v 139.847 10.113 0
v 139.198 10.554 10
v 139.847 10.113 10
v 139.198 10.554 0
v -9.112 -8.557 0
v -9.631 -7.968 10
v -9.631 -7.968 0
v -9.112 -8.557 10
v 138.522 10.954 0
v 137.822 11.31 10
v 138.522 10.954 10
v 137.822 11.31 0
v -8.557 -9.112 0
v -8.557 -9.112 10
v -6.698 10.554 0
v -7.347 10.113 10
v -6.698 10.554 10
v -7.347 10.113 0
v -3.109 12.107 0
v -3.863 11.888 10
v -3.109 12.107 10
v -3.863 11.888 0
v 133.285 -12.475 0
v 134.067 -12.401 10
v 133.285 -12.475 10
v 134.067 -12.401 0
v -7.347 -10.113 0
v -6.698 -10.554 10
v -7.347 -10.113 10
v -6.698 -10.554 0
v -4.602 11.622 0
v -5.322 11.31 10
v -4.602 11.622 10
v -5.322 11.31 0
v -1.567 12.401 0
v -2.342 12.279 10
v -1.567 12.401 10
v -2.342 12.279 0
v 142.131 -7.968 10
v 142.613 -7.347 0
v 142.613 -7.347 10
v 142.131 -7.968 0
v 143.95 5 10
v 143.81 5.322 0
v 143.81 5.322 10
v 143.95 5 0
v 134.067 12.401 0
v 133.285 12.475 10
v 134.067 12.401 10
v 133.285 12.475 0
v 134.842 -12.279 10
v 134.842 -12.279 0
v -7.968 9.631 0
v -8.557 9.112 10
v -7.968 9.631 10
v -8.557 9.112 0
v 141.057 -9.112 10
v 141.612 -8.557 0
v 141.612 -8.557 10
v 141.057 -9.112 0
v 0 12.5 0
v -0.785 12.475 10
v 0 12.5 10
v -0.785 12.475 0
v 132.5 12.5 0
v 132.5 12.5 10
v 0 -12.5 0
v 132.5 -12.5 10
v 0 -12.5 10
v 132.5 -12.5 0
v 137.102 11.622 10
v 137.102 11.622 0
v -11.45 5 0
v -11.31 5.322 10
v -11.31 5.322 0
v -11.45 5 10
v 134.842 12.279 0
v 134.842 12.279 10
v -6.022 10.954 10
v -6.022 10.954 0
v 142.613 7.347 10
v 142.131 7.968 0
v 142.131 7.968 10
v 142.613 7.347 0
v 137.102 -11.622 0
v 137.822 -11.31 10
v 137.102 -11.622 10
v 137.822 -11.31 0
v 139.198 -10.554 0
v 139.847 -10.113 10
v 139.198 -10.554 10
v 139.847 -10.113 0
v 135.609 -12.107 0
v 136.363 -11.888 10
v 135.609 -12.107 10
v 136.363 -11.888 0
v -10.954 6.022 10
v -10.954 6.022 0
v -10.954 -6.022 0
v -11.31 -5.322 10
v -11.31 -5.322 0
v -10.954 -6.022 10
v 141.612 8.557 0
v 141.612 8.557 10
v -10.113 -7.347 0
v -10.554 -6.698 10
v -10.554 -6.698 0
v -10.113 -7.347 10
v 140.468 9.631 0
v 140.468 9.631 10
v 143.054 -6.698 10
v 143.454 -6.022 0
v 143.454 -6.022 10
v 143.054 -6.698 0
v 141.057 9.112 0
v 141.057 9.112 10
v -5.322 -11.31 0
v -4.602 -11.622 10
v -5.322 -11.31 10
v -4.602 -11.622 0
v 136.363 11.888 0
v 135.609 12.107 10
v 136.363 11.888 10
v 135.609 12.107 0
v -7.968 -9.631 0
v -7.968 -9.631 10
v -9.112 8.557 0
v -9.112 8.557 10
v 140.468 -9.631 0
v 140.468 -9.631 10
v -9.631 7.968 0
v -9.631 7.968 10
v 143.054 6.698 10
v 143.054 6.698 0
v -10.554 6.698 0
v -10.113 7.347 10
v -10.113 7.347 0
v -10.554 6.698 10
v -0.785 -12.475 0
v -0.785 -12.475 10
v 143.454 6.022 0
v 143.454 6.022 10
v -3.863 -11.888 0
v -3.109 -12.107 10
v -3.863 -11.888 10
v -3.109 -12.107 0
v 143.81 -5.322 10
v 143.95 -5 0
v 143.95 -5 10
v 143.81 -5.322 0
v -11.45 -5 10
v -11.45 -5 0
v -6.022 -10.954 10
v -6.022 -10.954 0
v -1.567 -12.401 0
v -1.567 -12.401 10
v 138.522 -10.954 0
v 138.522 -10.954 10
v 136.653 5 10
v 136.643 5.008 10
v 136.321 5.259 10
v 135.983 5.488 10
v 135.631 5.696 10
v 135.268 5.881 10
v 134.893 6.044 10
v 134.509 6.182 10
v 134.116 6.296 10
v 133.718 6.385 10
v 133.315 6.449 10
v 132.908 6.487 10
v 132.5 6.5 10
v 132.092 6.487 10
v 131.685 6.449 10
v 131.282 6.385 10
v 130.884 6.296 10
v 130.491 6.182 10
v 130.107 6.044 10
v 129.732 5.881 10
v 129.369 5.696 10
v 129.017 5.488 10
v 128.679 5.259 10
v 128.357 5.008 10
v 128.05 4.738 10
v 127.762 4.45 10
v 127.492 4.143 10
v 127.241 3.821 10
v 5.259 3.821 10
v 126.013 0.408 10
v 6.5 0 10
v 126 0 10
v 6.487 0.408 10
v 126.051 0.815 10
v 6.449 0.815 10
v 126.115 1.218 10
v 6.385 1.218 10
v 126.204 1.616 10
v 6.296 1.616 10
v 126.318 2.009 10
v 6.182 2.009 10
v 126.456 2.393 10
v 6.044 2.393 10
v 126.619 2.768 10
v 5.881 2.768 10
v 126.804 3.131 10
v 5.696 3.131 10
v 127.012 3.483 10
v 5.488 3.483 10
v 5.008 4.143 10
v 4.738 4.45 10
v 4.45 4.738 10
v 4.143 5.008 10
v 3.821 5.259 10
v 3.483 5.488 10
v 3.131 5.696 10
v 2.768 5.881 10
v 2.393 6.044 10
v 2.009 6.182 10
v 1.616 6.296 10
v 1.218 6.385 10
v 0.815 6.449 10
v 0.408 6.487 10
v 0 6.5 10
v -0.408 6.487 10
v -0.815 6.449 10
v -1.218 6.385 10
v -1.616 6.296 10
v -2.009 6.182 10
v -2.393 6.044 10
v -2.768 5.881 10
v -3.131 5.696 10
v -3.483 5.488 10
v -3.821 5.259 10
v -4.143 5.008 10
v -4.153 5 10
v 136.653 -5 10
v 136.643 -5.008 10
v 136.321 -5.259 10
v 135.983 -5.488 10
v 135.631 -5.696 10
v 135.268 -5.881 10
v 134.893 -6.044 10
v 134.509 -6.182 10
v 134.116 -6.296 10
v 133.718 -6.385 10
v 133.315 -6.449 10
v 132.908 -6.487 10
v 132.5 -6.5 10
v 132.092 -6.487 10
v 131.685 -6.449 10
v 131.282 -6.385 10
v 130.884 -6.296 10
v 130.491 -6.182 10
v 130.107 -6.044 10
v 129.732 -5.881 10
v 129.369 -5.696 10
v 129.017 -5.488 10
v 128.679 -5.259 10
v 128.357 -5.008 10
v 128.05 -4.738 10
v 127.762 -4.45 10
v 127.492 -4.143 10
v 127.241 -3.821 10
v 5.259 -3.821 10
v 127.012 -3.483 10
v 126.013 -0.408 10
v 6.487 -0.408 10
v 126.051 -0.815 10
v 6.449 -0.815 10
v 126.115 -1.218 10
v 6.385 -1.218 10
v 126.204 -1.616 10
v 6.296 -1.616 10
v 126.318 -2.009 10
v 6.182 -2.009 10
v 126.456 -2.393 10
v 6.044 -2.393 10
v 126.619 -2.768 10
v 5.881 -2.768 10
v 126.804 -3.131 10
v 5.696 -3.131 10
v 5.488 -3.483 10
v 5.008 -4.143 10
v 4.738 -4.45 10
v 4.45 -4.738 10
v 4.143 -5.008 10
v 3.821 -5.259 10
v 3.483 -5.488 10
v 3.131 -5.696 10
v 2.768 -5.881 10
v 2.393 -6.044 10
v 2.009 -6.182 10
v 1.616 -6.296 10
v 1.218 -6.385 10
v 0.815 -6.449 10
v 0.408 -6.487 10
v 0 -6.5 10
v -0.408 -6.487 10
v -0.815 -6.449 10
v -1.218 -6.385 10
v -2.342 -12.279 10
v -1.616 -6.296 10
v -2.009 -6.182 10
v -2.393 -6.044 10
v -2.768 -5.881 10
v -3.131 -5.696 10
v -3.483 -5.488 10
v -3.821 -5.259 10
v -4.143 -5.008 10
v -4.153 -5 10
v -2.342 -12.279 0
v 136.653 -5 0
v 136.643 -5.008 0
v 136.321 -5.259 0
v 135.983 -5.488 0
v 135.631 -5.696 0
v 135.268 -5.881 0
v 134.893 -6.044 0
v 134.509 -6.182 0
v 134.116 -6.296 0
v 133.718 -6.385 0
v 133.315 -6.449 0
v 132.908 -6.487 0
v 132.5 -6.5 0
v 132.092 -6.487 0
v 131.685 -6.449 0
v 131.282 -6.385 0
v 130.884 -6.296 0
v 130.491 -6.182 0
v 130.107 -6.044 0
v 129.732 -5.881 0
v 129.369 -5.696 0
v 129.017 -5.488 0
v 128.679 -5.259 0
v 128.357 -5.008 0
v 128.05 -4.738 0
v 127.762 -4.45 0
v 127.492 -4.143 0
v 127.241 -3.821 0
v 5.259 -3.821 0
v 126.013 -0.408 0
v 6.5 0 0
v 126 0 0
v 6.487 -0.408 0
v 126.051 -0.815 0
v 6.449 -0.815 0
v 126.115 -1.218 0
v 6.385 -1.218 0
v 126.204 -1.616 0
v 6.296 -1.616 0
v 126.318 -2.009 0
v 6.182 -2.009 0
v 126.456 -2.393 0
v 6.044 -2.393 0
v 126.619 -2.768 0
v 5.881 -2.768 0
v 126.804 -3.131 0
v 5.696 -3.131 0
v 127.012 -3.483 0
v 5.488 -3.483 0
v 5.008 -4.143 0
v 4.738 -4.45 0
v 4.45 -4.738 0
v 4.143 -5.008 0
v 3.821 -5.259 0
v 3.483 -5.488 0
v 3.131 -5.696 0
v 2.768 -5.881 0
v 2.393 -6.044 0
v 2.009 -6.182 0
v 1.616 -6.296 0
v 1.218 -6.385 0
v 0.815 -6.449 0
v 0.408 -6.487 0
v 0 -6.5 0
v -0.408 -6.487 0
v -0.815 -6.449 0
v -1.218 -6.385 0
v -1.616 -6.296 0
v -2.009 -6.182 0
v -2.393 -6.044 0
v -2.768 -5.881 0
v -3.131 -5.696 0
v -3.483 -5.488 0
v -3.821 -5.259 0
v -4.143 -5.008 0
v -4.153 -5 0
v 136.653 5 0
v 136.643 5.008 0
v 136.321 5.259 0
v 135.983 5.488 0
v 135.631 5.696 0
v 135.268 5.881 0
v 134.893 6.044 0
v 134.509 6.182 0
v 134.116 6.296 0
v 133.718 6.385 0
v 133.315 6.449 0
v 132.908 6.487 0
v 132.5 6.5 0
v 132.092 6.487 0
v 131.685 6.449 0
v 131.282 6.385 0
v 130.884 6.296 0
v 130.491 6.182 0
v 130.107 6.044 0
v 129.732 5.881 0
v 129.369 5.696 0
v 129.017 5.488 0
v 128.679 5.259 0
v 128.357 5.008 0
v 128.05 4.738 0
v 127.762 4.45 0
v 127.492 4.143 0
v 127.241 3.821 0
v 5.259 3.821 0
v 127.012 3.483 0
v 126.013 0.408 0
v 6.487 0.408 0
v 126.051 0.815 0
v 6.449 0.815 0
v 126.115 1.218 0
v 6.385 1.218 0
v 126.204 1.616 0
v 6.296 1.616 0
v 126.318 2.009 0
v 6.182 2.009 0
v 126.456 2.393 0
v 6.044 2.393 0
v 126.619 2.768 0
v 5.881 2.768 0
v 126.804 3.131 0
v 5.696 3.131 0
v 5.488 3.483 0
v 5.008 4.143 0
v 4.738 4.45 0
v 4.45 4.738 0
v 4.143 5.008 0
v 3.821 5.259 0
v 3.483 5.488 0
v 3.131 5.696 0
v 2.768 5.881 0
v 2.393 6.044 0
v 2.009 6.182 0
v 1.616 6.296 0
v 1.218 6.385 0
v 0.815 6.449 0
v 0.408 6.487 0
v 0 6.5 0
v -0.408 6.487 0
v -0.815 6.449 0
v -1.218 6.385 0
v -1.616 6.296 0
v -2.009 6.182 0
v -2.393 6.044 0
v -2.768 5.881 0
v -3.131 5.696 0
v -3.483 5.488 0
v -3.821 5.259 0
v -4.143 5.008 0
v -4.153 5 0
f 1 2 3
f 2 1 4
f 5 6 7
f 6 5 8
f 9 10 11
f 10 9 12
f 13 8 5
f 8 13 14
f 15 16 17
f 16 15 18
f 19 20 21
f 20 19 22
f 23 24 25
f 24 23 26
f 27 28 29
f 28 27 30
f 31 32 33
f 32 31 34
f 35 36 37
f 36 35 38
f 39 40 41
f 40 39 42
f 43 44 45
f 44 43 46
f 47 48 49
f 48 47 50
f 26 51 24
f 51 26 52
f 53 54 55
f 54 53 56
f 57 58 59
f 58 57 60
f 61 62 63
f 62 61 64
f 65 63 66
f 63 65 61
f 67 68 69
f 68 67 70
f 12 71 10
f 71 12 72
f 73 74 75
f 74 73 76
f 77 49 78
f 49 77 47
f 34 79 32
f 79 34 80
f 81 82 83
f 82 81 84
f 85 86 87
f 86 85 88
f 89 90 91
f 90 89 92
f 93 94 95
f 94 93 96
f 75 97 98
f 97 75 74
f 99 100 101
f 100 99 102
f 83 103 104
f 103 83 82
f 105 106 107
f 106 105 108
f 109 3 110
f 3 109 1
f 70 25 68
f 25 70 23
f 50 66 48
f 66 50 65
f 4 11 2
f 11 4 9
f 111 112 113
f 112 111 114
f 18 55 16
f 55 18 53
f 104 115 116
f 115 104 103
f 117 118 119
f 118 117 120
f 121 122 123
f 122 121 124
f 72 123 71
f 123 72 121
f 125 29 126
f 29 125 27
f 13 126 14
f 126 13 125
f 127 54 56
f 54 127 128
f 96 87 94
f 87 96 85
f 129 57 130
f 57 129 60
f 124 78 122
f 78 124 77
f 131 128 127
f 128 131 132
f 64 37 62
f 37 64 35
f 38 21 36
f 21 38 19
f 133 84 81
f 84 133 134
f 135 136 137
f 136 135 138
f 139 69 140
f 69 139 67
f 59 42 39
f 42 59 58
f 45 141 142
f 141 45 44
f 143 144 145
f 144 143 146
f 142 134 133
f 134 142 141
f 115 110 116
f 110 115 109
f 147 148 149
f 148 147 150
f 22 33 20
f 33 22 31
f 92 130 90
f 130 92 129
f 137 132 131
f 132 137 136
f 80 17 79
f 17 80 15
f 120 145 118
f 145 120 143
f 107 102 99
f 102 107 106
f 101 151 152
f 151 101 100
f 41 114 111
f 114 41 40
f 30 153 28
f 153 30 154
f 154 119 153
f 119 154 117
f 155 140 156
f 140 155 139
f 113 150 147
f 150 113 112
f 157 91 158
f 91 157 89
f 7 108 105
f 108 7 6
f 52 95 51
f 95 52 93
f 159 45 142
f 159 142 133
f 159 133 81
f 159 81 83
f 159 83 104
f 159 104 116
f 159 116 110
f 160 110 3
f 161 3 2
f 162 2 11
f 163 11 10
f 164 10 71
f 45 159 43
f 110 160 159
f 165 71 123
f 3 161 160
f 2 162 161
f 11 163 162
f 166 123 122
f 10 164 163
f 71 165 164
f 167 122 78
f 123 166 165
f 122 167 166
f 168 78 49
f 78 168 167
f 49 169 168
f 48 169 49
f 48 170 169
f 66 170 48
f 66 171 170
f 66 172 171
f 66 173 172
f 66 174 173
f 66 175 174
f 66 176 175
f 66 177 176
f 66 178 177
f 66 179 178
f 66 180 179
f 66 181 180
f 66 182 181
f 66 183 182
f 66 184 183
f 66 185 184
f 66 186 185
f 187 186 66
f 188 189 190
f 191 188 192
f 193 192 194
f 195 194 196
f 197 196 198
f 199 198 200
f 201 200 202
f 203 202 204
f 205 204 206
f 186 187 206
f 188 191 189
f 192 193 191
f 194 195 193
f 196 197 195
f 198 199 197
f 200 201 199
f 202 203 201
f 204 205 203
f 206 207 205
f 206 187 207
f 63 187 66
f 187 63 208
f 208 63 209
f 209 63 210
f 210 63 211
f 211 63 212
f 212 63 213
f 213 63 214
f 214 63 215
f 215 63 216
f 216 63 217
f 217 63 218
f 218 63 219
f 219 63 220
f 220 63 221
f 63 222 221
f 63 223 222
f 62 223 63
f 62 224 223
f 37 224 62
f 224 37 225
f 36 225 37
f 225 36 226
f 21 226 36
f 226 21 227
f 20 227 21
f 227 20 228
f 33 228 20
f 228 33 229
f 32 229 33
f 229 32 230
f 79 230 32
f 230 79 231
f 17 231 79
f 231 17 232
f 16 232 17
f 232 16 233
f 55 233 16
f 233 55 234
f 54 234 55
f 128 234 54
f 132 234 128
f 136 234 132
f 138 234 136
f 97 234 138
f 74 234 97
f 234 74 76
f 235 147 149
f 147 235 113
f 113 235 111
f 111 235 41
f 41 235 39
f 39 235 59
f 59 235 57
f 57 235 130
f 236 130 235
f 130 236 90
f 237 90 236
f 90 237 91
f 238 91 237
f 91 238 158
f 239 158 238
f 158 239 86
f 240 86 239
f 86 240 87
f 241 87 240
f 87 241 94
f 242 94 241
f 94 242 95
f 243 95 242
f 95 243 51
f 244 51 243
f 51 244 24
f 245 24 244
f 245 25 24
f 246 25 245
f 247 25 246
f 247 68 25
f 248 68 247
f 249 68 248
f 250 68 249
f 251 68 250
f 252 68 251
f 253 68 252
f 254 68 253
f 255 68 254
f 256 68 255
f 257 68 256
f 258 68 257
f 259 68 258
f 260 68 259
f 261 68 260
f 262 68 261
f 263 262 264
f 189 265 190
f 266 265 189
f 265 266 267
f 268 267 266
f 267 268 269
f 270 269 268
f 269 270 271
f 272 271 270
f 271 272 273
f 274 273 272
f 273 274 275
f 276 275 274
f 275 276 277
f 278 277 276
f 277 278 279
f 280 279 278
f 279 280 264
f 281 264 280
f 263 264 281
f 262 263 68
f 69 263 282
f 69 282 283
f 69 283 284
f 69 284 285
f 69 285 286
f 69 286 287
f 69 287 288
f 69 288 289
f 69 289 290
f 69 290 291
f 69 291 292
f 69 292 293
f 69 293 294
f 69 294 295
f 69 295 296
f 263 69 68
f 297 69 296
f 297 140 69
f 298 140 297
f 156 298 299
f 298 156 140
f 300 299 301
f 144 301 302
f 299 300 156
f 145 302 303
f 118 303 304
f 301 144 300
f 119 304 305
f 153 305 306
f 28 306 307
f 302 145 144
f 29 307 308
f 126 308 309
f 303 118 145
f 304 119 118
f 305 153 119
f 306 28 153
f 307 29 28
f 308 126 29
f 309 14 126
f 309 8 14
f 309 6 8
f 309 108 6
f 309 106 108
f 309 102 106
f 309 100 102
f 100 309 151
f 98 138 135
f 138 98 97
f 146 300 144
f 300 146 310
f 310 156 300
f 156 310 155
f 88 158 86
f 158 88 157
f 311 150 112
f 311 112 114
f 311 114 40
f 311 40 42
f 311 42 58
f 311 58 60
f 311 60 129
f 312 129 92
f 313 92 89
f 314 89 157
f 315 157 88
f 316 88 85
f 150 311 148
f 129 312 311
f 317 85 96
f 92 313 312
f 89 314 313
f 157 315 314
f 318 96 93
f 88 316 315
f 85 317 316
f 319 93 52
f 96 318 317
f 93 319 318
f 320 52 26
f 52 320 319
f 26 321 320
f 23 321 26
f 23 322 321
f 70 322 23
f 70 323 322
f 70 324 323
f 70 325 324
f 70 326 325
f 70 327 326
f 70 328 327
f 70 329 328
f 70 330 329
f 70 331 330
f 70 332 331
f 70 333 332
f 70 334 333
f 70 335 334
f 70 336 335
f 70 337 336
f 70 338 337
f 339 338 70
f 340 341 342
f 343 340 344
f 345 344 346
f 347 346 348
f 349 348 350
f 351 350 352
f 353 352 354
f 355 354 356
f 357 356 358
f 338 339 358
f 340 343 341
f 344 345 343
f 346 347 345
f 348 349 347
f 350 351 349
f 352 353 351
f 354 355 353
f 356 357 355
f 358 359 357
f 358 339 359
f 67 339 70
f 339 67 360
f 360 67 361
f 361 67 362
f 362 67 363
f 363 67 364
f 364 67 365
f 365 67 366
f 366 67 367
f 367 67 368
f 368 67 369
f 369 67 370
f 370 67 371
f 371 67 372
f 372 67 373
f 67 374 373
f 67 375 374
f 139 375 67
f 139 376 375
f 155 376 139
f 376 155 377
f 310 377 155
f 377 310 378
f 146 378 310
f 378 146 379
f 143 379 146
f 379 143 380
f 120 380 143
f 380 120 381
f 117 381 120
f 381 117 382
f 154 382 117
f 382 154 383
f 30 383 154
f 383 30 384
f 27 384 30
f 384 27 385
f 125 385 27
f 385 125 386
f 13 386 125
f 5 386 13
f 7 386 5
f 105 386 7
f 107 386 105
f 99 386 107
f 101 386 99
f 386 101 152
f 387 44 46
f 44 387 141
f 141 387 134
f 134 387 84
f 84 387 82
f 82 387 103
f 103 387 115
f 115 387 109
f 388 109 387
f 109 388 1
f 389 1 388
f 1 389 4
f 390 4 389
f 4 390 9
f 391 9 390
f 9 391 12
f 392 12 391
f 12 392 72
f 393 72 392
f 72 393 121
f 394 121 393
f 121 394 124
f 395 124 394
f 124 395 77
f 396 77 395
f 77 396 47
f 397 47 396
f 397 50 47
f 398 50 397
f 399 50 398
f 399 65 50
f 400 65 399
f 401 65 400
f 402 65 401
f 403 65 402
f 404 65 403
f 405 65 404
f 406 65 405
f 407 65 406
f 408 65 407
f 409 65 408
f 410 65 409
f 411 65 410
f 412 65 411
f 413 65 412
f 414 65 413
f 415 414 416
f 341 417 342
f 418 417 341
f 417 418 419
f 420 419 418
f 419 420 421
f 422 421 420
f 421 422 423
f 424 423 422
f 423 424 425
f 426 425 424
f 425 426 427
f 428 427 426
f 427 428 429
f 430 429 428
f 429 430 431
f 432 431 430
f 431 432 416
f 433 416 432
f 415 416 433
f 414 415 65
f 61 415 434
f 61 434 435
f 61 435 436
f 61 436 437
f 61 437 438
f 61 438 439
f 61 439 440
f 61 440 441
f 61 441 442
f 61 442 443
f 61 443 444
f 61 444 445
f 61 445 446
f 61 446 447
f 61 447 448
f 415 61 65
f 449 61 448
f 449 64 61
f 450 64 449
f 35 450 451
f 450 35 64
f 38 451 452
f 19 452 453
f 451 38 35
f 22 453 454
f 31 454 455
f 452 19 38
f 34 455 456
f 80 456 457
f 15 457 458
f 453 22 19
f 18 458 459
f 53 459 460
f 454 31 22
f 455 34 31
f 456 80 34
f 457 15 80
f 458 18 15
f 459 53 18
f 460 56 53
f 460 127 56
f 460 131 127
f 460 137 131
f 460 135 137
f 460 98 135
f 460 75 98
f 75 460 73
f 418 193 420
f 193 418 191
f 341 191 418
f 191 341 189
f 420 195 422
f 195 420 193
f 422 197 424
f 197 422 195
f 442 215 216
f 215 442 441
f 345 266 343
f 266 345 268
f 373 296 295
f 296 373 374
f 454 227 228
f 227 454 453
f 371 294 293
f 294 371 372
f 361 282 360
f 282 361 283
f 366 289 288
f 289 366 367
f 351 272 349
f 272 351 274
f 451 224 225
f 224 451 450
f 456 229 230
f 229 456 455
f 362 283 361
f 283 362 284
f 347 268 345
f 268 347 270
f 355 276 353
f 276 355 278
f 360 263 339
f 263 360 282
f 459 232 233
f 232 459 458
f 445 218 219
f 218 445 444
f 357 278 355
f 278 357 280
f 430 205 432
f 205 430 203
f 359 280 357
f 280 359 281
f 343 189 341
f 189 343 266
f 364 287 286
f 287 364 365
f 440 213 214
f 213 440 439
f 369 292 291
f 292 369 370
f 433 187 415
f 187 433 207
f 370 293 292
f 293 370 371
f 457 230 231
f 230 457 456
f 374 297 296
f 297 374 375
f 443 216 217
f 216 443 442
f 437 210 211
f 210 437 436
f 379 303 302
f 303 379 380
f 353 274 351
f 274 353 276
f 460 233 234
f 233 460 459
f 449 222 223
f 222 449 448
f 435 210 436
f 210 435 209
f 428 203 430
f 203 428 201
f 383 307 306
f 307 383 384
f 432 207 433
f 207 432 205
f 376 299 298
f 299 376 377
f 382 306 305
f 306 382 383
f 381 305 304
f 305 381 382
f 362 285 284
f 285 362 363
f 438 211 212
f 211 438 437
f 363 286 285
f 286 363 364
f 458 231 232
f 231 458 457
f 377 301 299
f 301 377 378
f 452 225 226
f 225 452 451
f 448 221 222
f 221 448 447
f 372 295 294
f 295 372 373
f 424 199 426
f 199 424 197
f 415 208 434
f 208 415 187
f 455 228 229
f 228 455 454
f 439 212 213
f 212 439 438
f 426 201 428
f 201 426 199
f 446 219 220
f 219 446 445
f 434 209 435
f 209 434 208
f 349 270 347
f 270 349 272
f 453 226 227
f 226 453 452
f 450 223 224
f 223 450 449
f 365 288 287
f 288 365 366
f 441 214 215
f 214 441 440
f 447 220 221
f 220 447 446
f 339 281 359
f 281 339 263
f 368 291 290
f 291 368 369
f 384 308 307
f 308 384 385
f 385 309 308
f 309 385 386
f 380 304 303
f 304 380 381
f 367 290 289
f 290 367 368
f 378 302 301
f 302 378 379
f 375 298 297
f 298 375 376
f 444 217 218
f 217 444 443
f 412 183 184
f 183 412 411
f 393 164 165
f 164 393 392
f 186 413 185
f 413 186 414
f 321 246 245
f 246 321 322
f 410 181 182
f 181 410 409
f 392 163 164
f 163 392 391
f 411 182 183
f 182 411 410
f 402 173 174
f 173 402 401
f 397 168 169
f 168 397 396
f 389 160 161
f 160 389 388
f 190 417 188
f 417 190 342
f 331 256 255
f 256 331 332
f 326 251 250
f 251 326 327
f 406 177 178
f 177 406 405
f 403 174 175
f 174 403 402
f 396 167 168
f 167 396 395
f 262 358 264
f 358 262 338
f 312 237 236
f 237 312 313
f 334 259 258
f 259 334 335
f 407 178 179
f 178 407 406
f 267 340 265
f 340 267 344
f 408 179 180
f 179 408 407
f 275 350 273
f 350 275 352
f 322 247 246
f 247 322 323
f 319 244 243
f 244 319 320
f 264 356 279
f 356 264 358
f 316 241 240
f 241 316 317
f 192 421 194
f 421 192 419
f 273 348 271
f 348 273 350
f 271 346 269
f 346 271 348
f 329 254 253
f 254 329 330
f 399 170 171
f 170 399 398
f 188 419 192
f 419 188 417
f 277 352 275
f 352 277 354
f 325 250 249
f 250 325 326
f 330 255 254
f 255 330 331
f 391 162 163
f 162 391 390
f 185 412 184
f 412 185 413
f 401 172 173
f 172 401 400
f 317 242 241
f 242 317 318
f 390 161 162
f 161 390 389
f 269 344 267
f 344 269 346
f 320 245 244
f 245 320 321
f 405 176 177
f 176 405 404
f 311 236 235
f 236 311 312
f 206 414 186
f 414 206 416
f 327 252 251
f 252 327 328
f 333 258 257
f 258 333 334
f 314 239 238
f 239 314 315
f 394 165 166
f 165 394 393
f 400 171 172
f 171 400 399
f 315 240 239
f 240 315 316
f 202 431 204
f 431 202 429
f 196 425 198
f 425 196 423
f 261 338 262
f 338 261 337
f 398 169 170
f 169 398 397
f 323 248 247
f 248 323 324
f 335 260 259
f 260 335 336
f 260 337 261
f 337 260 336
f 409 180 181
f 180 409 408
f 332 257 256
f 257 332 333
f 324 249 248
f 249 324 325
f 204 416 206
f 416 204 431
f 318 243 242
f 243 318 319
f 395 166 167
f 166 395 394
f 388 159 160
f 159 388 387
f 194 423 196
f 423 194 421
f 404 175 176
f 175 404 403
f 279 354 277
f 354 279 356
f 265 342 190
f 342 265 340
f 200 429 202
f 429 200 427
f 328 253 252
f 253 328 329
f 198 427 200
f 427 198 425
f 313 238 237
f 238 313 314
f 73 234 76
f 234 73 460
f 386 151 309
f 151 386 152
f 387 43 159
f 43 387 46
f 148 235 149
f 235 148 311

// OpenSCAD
$fn=100;
dr=10;
l=120;
w=25;
t=6;
tz=10;

hammock();

module hammock(){
    difference(){
        hull(){
            translate([w/2-t,-w/2,0])
            cube([l,w,tz]);
                       
            cylinder(d=w, h=tz);
            
            translate([l+w/2,0,0])
            cylinder(d=w, h=tz);
        }
        //-------------------
        translate([0,0,-.1])
        cylinder(d=w-t*2, h=tz+1);
        translate([l+w/2,0,-.1])
        cylinder(d=w-t*2, h=tz+1);
        
        translate([-w,-dr/2,-.1])
        cube([w,dr,tz+1]);
        translate([l+w/2,-dr/2,-.1])
        cube([w,dr,tz+1]);
        
    }
}
